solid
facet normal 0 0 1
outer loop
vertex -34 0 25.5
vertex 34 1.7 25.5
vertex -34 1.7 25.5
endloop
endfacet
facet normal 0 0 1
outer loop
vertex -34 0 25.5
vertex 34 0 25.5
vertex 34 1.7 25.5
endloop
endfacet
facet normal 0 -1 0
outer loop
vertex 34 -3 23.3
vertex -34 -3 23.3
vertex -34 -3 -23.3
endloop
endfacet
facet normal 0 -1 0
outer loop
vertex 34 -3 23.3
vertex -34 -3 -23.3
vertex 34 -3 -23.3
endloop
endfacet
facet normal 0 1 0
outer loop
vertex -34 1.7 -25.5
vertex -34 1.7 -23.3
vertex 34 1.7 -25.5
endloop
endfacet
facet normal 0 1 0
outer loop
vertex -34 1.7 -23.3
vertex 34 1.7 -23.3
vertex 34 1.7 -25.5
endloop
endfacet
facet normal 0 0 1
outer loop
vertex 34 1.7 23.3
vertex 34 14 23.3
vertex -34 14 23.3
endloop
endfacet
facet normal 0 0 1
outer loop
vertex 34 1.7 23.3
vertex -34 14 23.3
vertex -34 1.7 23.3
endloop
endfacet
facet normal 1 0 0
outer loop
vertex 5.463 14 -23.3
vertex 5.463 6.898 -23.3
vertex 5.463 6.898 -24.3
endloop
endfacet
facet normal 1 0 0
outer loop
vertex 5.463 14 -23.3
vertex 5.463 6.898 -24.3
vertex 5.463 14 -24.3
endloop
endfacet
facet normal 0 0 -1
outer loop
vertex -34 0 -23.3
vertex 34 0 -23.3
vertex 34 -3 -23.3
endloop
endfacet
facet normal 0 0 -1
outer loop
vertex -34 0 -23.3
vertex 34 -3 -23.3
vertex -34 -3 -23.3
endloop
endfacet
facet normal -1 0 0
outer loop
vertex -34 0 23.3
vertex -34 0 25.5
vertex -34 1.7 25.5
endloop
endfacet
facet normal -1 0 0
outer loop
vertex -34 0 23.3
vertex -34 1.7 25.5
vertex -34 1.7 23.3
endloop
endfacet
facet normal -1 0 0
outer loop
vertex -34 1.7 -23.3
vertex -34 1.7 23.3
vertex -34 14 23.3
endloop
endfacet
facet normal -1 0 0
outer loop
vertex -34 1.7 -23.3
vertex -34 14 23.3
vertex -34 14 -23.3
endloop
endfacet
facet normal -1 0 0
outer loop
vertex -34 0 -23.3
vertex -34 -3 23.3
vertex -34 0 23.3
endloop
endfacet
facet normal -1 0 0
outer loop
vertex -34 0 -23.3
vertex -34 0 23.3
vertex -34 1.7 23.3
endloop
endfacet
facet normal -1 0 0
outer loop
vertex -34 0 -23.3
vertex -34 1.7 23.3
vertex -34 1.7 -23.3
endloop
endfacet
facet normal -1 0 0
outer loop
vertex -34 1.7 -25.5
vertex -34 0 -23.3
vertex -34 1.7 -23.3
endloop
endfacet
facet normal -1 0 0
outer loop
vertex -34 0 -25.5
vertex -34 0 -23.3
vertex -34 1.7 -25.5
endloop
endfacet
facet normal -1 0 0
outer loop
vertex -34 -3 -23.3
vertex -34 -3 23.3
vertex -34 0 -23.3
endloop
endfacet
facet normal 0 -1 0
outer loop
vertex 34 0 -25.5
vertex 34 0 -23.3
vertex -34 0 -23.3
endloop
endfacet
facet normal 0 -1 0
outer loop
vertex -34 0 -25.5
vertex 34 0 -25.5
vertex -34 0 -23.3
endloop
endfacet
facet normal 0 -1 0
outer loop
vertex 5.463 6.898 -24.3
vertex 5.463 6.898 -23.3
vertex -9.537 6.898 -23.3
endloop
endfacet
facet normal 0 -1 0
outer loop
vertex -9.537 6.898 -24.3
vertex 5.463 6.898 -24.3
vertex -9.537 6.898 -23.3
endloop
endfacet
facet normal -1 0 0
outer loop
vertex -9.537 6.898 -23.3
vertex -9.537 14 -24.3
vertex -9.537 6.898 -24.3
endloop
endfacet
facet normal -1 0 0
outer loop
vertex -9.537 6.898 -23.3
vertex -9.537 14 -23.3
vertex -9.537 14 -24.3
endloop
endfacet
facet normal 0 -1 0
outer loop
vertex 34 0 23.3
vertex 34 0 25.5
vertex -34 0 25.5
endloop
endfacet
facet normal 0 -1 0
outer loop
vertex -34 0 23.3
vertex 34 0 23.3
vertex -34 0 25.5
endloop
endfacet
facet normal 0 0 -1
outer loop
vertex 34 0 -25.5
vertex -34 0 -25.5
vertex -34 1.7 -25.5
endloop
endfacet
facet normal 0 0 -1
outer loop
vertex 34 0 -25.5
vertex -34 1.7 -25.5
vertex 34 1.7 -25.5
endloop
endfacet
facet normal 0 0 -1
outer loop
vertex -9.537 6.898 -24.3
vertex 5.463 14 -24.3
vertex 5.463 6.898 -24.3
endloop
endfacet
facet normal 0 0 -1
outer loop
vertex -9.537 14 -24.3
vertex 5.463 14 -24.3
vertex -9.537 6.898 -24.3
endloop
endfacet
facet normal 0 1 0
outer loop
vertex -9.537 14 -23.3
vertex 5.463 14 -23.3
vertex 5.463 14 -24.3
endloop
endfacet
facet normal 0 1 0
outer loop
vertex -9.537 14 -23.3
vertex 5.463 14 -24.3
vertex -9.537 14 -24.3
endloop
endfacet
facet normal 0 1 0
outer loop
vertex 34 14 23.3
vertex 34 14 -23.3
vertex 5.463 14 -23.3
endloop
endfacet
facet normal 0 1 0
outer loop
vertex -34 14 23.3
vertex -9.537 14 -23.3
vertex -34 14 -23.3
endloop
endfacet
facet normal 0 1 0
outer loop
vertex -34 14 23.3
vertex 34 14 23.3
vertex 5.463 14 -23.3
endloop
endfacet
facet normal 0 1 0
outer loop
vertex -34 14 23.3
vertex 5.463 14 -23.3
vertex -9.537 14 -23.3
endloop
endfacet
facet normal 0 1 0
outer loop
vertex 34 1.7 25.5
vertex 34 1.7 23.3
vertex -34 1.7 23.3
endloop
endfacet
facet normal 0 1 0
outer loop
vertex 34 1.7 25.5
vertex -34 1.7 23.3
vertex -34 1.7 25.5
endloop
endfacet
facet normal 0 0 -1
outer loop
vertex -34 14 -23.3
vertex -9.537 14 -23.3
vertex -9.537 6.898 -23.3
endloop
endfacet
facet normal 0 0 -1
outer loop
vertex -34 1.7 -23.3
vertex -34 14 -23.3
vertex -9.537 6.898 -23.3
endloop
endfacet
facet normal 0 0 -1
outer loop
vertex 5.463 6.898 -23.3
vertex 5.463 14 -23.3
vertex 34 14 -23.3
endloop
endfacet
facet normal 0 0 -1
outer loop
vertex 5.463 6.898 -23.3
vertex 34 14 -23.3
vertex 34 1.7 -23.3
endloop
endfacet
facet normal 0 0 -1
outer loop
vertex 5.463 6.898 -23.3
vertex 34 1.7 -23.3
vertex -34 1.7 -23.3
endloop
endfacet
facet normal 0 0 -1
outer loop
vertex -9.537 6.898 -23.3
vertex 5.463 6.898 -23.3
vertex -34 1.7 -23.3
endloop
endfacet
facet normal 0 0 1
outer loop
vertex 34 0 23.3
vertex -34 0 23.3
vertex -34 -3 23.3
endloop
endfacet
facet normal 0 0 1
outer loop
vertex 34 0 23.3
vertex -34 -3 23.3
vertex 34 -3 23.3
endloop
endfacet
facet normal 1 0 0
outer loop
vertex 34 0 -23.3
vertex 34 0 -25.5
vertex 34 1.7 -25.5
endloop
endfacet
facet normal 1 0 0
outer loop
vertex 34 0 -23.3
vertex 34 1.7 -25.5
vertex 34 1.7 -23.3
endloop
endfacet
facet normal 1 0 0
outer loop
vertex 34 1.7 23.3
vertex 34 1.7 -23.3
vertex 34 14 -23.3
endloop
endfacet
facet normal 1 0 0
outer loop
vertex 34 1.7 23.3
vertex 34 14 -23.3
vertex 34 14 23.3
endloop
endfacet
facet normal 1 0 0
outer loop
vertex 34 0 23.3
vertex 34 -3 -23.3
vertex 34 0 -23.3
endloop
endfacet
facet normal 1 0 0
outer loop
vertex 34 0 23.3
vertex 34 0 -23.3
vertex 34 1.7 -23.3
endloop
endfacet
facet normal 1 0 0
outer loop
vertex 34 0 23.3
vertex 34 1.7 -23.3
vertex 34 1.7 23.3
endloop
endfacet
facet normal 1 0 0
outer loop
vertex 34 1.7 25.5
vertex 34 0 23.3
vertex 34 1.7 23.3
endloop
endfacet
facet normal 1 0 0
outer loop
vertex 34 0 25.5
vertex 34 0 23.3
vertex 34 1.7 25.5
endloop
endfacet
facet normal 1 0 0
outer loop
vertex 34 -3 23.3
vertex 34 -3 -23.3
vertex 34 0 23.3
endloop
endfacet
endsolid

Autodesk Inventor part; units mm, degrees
ref_plane "YZ Plane" through (0, 0, 0) normal (1, 0, 0) x (0, 1, 0)
ref_plane "XZ Plane" through (0, 0, 0) normal (0, 1, 0) x (-1, 0, 0)
ref_plane "XY Plane" through (0, 0, 0) normal (0, 0, 1) x (1, 0, 0)
sketch "Boceto1" plane through (0, 0, 0) normal (0, 1, 0) x (-1, 0, 0)
  line L0 (-34, 25.5) -> (34, 25.5)
  line L1 (34, 25.5) -> (34, -25.5)
  line L2 (34, -25.5) -> (-34, -25.5)
  line L3 (-34, -25.5) -> (-34, 25.5)
  line L4 (-34, 25.5) -> (34, -25.5) construction
  line L5 (34, 25.5) -> (-34, -25.5) construction
  point P0 (0, 0)
  dimension "d0" = 68
  dimension "d1" = 51
extrude "Extrusión1" add sketch "Boceto1" along normal blind 14
sketch "Boceto2" plane through (34, 0, 25.5) normal (1, 0, 0) x (0, 0, -1)
  line L0 (51, 0) -> (0, 0) projected
  line L1 (0, 0) -> (2.2, 0)
  line L2 (2.2, 0) -> (2.2, 1.7)
  line L3 (2.2, 1.7) -> (0, 1.7)
  line L4 (0, 1.7) -> (0, 0)
  line L5 (0, 0) -> (0, 14) projected
  line L6 (2.2, 1.7) -> (0, 1.7)
  line L7 (0, 1.7) -> (0, 14)
  line L8 (0, 14) -> (2.2, 14)
  line L9 (2.2, 14) -> (2.2, 1.7)
  line L10 (25.5, -2.8463) -> (25.5, 17.6313)
  line L11 (48.8, 1.7) -> (51, 1.7)
  line L12 (51, 0) -> (51, 14)
  line L13 (51, 14) -> (48.8, 14)
  line L14 (48.8, 14) -> (48.8, 1.7)
  point P0 (25.5, 0)
  dimension "d4" = 2.2
  dimension "d5" = 1.7
  dimension "d8" = 51
  dimension "d9" = 12.3
  dimension "d10" = 46.6
extrude "Extrusión2" cut sketch "Boceto2" against normal through all contours L11 L14 L13 L12 | L3 L5 L8 L9
sketch "Boceto3" plane through (34, 1.7, -23.3) normal (0, 0, -1) x (-1, 0, 0)
  line L0 (68, 12.3) -> (0, 12.3) projected
  line L1 (0, 0) -> (68, 0) projected
  line L2 (0, 12.3) -> (34, 12.3)
  line L3 (34, 12.3) -> (34, 0)
  line L4 (34, 0) -> (0, 0)
  line L5 (0, 0) -> (0, 12.3)
  line L6 (68, 0) -> (68, 12.3) projected
  line L7 (68, 12.3) -> (34, 12.3)
  line L8 (34, 12.3) -> (34, 5.1984)
  line L9 (34, 5.1984) -> (68, 5.1984)
  line L10 (68, 5.1984) -> (68, 12.3)
  line L11 (34, 12.3) -> (23.5366, 12.3)
  line L12 (23.5366, 12.3) -> (28.5366, 12.3)
  line L13 (28.5366, 12.3) -> (43.5366, 12.3)
  line L14 (28.5366, 12.3) -> (43.5366, 12.3)
  line L15 (43.5366, 12.3) -> (43.5366, 5.1984)
  line L16 (43.5366, 5.1984) -> (28.5366, 5.1984)
  line L17 (28.5366, 5.1984) -> (28.5366, 12.3)
  point P0 (34, -1.7)
  point P1 (43.5366, 12.3)
  point P2 (28.5366, 12.3)
  point P3 (34, 5.1984)
  dimension "d11" = 34
  dimension "d12" = 5
  dimension "d13" = 15
extrude "Extrusión3" add sketch "Boceto3" along normal blind 1 contours L15 L9 L3 L0 | L3 L16 L17 L0
sketch "Boceto4" plane through (0, 0, 0) normal (0, -1, 0) x (1, 0, 0)
  line L0 (-34, 23.3) -> (34, 23.3) projected
  line L1 (-34, -23.3) -> (-34, 23.3) projected
  line L2 (34, 23.3) -> (-34, 23.3)
  line L3 (-9.5366, -23.3) -> (-34, -23.3) projected
  line L4 (-34, 23.3) -> (-34, -23.3)
  line L5 (34, 23.3) -> (34, -23.3) projected
  line L6 (-34, -23.3) -> (34, -23.3)
  line L7 (34, -23.3) -> (34, 23.3)
  point P0 (0, 0)
extrude "Extrusión4" add sketch "Boceto4" along normal blind 3
properties part number "PCB_Tamaño"
